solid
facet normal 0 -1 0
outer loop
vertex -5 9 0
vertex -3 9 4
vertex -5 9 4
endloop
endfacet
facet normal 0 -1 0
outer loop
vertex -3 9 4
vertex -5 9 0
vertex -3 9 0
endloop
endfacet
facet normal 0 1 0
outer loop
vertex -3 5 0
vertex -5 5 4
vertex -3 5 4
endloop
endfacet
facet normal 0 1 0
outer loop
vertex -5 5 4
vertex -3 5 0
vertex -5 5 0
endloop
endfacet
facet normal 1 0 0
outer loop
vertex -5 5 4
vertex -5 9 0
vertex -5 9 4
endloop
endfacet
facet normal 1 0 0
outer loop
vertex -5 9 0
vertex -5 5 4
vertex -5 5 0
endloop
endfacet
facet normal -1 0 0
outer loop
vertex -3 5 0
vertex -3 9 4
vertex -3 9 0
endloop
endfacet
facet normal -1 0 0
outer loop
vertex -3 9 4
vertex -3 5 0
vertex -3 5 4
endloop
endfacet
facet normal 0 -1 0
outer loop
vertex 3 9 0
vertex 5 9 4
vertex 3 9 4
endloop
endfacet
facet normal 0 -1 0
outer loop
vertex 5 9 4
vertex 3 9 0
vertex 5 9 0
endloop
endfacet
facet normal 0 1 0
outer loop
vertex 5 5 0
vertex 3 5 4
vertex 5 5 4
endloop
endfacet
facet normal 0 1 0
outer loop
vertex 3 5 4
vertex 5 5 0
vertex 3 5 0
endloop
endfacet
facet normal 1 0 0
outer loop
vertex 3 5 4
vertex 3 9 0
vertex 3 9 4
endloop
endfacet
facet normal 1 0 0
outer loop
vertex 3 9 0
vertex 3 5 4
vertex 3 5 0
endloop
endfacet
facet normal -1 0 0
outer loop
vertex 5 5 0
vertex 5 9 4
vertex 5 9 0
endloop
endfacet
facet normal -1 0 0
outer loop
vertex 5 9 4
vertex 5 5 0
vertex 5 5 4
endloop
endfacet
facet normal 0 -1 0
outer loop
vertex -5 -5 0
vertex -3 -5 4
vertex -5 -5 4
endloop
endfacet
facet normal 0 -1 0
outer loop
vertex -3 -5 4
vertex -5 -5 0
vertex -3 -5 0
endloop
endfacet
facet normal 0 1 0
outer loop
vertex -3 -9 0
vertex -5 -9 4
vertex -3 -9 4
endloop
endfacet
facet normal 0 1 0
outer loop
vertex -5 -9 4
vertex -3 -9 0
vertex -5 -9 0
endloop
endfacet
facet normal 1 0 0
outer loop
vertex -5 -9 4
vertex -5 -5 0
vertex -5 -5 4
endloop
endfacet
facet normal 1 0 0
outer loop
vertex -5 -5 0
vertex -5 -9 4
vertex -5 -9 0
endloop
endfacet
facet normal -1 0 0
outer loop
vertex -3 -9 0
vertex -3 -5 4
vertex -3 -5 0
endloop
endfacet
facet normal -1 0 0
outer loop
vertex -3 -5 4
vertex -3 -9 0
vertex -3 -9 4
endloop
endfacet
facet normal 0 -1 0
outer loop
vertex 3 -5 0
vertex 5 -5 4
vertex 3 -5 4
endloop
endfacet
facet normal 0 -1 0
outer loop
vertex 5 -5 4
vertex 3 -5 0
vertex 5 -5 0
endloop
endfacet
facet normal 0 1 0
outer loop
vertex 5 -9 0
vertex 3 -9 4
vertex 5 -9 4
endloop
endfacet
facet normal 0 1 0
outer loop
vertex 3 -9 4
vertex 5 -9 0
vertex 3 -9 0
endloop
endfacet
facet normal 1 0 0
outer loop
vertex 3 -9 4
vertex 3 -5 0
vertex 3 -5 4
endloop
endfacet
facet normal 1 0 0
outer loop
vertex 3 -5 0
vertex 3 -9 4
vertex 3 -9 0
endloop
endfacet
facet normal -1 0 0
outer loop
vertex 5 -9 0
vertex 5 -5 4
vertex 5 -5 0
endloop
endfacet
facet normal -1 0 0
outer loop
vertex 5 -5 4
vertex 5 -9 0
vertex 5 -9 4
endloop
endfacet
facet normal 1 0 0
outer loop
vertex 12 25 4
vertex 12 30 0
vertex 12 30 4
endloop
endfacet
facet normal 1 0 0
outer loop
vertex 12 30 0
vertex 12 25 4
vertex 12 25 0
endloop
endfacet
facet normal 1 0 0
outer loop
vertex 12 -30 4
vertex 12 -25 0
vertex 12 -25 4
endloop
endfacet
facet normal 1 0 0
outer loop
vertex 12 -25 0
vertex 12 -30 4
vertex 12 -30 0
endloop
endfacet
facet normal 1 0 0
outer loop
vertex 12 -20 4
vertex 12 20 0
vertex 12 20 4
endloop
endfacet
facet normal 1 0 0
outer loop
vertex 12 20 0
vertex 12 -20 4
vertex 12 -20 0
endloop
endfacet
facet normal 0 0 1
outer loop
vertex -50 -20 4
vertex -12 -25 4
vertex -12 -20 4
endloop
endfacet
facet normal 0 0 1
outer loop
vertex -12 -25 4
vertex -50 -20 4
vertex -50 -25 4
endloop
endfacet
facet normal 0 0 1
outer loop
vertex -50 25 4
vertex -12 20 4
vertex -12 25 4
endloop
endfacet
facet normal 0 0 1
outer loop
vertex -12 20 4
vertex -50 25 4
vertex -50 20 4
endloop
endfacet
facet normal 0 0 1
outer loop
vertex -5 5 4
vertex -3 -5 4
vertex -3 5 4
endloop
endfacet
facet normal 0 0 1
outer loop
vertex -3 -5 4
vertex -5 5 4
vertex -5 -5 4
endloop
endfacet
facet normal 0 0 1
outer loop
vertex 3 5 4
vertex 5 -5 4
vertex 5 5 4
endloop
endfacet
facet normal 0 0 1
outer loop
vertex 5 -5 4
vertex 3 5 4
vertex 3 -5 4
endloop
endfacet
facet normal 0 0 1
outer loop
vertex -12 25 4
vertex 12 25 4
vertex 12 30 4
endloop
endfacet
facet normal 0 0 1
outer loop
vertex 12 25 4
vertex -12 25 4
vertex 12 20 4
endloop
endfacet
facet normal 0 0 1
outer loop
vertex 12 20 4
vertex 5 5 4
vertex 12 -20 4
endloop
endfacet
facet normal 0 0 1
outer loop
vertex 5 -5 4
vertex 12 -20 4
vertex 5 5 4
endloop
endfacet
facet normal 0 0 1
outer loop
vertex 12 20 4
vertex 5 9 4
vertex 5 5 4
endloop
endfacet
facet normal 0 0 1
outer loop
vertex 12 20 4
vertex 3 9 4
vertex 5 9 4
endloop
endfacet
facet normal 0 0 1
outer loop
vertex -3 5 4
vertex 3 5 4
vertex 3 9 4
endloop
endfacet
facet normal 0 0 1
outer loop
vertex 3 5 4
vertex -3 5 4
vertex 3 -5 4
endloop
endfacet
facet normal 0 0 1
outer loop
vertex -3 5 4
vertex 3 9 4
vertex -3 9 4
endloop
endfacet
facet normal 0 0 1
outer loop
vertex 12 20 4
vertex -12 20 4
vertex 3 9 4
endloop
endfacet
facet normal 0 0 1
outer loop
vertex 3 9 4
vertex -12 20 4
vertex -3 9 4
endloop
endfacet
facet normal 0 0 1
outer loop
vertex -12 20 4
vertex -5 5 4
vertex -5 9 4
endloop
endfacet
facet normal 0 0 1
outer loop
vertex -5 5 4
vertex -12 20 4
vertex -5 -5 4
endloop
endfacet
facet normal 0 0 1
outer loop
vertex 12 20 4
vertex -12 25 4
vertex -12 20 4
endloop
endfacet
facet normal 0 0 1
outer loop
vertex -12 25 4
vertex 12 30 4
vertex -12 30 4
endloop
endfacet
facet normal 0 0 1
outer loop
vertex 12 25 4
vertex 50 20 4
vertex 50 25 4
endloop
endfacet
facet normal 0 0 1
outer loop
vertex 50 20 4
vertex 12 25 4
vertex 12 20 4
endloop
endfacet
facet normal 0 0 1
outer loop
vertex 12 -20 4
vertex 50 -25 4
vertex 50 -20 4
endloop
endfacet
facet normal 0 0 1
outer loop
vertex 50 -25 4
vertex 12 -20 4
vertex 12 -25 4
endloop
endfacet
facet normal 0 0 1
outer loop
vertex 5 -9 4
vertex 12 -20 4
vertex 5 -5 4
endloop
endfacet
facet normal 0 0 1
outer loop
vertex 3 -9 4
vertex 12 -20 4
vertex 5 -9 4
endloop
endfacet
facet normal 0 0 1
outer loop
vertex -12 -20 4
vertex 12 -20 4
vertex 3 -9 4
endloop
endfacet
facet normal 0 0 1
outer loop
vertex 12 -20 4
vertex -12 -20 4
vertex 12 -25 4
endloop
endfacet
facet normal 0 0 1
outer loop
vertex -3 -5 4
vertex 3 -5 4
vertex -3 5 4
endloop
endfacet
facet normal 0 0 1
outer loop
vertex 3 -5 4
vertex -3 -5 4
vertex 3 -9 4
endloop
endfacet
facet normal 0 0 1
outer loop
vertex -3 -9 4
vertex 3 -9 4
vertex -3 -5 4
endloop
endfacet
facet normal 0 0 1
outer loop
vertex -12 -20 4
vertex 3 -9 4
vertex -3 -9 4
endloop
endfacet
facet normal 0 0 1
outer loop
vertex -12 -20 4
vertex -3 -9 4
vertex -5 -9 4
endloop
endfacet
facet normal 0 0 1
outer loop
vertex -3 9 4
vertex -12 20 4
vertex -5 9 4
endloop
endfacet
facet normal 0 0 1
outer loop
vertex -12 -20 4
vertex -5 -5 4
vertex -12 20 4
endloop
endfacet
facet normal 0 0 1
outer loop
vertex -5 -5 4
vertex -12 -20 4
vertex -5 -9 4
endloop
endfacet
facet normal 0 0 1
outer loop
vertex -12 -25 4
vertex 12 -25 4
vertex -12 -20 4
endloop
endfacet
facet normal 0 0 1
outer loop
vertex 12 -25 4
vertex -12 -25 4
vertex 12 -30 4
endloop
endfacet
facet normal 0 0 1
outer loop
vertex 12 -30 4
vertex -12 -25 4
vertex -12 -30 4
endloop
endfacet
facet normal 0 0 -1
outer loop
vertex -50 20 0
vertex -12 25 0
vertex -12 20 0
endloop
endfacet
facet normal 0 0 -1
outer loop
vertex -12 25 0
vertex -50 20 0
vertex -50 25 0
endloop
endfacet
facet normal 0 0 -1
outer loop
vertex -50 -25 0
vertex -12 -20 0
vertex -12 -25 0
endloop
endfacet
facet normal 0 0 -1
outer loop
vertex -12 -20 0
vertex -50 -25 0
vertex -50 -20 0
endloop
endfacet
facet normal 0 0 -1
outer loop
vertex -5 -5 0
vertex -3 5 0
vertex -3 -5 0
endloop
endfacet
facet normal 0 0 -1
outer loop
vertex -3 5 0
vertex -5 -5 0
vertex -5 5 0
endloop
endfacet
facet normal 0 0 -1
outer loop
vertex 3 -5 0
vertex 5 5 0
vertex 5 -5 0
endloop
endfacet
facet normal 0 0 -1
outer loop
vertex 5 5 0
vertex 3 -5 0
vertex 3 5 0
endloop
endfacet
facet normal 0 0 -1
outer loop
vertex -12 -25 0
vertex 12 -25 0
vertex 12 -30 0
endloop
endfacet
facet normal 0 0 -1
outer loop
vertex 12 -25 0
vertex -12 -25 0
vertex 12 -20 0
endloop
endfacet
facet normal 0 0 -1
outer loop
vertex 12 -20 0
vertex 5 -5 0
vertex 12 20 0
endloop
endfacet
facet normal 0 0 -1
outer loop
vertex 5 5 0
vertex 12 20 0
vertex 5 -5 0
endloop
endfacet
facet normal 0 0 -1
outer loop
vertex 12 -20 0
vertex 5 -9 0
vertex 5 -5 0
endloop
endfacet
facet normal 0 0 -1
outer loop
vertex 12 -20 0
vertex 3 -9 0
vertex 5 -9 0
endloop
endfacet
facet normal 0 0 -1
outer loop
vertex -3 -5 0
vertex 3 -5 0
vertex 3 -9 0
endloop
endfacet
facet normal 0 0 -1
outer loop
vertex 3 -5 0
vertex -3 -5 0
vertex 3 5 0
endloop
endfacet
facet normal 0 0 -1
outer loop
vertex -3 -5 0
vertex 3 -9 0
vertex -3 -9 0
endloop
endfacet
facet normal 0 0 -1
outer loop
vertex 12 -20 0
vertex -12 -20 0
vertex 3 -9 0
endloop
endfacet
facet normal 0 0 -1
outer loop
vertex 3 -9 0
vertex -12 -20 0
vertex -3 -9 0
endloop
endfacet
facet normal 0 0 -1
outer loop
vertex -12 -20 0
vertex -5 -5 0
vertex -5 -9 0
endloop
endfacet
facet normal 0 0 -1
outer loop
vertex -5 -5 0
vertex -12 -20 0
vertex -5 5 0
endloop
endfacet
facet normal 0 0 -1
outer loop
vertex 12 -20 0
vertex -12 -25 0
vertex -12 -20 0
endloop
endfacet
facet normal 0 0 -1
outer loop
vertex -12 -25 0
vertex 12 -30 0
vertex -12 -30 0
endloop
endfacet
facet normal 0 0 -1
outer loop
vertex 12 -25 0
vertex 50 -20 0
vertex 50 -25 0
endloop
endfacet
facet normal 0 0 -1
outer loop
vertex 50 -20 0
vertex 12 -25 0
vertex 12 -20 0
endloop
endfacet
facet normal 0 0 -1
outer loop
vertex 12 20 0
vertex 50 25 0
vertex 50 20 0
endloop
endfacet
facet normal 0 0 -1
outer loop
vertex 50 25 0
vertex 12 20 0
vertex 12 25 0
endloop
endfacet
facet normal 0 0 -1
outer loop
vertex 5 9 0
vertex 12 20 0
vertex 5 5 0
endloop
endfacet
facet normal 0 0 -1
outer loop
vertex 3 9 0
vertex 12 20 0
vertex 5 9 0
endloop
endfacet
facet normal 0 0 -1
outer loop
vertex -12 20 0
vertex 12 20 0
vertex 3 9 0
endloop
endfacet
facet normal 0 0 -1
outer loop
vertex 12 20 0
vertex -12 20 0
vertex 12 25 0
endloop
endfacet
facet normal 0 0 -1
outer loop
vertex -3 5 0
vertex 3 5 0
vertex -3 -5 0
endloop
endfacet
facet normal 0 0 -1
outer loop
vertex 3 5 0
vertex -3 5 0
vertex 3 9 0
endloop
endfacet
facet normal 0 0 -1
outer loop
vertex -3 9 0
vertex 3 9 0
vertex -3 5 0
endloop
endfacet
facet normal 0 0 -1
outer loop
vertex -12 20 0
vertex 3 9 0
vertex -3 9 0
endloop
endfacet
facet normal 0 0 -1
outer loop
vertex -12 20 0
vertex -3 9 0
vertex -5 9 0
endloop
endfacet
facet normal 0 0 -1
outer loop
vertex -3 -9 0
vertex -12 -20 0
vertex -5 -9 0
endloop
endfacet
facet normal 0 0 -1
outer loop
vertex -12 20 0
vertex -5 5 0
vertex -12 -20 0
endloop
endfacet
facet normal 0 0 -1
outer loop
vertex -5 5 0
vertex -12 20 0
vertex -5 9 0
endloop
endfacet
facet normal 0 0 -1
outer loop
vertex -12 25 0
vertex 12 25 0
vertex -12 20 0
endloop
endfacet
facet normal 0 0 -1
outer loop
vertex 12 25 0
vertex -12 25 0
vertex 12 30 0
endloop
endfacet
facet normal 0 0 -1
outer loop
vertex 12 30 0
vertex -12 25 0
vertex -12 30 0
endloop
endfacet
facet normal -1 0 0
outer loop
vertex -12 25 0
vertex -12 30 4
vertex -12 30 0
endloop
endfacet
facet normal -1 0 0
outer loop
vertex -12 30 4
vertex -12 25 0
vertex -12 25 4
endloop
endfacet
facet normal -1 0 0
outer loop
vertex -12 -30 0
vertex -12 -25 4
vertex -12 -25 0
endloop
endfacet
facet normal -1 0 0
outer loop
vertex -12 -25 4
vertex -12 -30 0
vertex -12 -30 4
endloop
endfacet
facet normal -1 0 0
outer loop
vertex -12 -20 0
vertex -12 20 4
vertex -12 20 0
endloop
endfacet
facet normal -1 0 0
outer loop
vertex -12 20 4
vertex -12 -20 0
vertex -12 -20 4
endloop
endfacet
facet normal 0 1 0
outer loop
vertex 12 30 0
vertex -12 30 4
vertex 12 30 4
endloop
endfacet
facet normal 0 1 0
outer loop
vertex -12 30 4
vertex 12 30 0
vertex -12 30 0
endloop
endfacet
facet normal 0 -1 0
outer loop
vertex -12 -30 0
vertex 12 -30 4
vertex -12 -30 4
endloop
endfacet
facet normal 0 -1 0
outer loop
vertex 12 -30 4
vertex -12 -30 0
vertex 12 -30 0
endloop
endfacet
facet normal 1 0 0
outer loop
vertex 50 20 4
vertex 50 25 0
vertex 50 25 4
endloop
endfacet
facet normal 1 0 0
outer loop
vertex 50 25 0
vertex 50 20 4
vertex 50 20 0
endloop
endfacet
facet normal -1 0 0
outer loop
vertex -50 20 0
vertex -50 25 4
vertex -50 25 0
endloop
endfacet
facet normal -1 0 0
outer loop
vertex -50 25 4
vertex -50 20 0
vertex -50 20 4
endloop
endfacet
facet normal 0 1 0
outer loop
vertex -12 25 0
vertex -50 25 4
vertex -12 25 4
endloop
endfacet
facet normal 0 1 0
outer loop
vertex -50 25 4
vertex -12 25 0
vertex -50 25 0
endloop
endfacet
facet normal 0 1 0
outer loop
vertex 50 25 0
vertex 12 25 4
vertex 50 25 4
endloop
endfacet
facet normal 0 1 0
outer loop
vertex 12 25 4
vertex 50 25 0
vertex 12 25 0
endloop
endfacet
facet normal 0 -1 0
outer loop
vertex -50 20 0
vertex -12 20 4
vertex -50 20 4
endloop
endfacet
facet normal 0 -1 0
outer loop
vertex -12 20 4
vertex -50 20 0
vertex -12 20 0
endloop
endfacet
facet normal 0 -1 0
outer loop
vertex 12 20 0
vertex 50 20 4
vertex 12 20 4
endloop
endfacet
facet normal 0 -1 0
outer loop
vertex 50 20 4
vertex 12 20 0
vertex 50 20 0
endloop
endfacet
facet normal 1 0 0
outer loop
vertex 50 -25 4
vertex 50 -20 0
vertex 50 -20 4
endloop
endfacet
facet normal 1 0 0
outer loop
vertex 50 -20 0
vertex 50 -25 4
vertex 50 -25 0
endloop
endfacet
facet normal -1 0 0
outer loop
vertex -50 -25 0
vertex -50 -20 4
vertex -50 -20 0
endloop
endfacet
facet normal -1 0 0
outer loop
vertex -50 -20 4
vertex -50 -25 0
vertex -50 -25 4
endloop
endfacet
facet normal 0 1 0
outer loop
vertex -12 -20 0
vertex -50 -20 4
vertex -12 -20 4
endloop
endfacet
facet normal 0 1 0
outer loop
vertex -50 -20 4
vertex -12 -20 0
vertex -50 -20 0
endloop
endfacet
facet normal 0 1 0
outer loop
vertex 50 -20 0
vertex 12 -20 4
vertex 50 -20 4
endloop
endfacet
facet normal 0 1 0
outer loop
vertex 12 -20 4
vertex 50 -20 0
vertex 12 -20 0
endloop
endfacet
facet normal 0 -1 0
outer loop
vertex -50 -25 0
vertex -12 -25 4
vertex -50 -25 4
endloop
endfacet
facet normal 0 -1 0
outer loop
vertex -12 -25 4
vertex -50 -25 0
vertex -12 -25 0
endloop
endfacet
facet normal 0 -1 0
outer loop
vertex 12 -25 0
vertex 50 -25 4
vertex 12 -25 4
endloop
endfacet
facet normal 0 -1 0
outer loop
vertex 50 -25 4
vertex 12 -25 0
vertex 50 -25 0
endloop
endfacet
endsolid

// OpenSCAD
$fn = 128;

union()
{
    /*Device handler*/
    translate([-50,20,0])
        cube(size=[100,5,4], center=false);

    translate([-50,-25,0])
        cube(size=[100,5,4], center=false);

    /*Center*/
    difference()
    {
        translate([-12,-30,0])
            cube([24,60,4], center=false);

        /*Clamp holes*/
        rotate(a=90, v=[0, 0, 1])
        {
            translate([5,3,-10])
                cube(size=[4,2,20]);

            translate([5,-3-2,-10])
                cube(size=[4,2,20]);

            translate([-9,3,-10])
                cube(size=[4,2,20]);

            translate([-9,-3-2,-10])
                cube(size=[4,2,20]);
        }
    }
}
